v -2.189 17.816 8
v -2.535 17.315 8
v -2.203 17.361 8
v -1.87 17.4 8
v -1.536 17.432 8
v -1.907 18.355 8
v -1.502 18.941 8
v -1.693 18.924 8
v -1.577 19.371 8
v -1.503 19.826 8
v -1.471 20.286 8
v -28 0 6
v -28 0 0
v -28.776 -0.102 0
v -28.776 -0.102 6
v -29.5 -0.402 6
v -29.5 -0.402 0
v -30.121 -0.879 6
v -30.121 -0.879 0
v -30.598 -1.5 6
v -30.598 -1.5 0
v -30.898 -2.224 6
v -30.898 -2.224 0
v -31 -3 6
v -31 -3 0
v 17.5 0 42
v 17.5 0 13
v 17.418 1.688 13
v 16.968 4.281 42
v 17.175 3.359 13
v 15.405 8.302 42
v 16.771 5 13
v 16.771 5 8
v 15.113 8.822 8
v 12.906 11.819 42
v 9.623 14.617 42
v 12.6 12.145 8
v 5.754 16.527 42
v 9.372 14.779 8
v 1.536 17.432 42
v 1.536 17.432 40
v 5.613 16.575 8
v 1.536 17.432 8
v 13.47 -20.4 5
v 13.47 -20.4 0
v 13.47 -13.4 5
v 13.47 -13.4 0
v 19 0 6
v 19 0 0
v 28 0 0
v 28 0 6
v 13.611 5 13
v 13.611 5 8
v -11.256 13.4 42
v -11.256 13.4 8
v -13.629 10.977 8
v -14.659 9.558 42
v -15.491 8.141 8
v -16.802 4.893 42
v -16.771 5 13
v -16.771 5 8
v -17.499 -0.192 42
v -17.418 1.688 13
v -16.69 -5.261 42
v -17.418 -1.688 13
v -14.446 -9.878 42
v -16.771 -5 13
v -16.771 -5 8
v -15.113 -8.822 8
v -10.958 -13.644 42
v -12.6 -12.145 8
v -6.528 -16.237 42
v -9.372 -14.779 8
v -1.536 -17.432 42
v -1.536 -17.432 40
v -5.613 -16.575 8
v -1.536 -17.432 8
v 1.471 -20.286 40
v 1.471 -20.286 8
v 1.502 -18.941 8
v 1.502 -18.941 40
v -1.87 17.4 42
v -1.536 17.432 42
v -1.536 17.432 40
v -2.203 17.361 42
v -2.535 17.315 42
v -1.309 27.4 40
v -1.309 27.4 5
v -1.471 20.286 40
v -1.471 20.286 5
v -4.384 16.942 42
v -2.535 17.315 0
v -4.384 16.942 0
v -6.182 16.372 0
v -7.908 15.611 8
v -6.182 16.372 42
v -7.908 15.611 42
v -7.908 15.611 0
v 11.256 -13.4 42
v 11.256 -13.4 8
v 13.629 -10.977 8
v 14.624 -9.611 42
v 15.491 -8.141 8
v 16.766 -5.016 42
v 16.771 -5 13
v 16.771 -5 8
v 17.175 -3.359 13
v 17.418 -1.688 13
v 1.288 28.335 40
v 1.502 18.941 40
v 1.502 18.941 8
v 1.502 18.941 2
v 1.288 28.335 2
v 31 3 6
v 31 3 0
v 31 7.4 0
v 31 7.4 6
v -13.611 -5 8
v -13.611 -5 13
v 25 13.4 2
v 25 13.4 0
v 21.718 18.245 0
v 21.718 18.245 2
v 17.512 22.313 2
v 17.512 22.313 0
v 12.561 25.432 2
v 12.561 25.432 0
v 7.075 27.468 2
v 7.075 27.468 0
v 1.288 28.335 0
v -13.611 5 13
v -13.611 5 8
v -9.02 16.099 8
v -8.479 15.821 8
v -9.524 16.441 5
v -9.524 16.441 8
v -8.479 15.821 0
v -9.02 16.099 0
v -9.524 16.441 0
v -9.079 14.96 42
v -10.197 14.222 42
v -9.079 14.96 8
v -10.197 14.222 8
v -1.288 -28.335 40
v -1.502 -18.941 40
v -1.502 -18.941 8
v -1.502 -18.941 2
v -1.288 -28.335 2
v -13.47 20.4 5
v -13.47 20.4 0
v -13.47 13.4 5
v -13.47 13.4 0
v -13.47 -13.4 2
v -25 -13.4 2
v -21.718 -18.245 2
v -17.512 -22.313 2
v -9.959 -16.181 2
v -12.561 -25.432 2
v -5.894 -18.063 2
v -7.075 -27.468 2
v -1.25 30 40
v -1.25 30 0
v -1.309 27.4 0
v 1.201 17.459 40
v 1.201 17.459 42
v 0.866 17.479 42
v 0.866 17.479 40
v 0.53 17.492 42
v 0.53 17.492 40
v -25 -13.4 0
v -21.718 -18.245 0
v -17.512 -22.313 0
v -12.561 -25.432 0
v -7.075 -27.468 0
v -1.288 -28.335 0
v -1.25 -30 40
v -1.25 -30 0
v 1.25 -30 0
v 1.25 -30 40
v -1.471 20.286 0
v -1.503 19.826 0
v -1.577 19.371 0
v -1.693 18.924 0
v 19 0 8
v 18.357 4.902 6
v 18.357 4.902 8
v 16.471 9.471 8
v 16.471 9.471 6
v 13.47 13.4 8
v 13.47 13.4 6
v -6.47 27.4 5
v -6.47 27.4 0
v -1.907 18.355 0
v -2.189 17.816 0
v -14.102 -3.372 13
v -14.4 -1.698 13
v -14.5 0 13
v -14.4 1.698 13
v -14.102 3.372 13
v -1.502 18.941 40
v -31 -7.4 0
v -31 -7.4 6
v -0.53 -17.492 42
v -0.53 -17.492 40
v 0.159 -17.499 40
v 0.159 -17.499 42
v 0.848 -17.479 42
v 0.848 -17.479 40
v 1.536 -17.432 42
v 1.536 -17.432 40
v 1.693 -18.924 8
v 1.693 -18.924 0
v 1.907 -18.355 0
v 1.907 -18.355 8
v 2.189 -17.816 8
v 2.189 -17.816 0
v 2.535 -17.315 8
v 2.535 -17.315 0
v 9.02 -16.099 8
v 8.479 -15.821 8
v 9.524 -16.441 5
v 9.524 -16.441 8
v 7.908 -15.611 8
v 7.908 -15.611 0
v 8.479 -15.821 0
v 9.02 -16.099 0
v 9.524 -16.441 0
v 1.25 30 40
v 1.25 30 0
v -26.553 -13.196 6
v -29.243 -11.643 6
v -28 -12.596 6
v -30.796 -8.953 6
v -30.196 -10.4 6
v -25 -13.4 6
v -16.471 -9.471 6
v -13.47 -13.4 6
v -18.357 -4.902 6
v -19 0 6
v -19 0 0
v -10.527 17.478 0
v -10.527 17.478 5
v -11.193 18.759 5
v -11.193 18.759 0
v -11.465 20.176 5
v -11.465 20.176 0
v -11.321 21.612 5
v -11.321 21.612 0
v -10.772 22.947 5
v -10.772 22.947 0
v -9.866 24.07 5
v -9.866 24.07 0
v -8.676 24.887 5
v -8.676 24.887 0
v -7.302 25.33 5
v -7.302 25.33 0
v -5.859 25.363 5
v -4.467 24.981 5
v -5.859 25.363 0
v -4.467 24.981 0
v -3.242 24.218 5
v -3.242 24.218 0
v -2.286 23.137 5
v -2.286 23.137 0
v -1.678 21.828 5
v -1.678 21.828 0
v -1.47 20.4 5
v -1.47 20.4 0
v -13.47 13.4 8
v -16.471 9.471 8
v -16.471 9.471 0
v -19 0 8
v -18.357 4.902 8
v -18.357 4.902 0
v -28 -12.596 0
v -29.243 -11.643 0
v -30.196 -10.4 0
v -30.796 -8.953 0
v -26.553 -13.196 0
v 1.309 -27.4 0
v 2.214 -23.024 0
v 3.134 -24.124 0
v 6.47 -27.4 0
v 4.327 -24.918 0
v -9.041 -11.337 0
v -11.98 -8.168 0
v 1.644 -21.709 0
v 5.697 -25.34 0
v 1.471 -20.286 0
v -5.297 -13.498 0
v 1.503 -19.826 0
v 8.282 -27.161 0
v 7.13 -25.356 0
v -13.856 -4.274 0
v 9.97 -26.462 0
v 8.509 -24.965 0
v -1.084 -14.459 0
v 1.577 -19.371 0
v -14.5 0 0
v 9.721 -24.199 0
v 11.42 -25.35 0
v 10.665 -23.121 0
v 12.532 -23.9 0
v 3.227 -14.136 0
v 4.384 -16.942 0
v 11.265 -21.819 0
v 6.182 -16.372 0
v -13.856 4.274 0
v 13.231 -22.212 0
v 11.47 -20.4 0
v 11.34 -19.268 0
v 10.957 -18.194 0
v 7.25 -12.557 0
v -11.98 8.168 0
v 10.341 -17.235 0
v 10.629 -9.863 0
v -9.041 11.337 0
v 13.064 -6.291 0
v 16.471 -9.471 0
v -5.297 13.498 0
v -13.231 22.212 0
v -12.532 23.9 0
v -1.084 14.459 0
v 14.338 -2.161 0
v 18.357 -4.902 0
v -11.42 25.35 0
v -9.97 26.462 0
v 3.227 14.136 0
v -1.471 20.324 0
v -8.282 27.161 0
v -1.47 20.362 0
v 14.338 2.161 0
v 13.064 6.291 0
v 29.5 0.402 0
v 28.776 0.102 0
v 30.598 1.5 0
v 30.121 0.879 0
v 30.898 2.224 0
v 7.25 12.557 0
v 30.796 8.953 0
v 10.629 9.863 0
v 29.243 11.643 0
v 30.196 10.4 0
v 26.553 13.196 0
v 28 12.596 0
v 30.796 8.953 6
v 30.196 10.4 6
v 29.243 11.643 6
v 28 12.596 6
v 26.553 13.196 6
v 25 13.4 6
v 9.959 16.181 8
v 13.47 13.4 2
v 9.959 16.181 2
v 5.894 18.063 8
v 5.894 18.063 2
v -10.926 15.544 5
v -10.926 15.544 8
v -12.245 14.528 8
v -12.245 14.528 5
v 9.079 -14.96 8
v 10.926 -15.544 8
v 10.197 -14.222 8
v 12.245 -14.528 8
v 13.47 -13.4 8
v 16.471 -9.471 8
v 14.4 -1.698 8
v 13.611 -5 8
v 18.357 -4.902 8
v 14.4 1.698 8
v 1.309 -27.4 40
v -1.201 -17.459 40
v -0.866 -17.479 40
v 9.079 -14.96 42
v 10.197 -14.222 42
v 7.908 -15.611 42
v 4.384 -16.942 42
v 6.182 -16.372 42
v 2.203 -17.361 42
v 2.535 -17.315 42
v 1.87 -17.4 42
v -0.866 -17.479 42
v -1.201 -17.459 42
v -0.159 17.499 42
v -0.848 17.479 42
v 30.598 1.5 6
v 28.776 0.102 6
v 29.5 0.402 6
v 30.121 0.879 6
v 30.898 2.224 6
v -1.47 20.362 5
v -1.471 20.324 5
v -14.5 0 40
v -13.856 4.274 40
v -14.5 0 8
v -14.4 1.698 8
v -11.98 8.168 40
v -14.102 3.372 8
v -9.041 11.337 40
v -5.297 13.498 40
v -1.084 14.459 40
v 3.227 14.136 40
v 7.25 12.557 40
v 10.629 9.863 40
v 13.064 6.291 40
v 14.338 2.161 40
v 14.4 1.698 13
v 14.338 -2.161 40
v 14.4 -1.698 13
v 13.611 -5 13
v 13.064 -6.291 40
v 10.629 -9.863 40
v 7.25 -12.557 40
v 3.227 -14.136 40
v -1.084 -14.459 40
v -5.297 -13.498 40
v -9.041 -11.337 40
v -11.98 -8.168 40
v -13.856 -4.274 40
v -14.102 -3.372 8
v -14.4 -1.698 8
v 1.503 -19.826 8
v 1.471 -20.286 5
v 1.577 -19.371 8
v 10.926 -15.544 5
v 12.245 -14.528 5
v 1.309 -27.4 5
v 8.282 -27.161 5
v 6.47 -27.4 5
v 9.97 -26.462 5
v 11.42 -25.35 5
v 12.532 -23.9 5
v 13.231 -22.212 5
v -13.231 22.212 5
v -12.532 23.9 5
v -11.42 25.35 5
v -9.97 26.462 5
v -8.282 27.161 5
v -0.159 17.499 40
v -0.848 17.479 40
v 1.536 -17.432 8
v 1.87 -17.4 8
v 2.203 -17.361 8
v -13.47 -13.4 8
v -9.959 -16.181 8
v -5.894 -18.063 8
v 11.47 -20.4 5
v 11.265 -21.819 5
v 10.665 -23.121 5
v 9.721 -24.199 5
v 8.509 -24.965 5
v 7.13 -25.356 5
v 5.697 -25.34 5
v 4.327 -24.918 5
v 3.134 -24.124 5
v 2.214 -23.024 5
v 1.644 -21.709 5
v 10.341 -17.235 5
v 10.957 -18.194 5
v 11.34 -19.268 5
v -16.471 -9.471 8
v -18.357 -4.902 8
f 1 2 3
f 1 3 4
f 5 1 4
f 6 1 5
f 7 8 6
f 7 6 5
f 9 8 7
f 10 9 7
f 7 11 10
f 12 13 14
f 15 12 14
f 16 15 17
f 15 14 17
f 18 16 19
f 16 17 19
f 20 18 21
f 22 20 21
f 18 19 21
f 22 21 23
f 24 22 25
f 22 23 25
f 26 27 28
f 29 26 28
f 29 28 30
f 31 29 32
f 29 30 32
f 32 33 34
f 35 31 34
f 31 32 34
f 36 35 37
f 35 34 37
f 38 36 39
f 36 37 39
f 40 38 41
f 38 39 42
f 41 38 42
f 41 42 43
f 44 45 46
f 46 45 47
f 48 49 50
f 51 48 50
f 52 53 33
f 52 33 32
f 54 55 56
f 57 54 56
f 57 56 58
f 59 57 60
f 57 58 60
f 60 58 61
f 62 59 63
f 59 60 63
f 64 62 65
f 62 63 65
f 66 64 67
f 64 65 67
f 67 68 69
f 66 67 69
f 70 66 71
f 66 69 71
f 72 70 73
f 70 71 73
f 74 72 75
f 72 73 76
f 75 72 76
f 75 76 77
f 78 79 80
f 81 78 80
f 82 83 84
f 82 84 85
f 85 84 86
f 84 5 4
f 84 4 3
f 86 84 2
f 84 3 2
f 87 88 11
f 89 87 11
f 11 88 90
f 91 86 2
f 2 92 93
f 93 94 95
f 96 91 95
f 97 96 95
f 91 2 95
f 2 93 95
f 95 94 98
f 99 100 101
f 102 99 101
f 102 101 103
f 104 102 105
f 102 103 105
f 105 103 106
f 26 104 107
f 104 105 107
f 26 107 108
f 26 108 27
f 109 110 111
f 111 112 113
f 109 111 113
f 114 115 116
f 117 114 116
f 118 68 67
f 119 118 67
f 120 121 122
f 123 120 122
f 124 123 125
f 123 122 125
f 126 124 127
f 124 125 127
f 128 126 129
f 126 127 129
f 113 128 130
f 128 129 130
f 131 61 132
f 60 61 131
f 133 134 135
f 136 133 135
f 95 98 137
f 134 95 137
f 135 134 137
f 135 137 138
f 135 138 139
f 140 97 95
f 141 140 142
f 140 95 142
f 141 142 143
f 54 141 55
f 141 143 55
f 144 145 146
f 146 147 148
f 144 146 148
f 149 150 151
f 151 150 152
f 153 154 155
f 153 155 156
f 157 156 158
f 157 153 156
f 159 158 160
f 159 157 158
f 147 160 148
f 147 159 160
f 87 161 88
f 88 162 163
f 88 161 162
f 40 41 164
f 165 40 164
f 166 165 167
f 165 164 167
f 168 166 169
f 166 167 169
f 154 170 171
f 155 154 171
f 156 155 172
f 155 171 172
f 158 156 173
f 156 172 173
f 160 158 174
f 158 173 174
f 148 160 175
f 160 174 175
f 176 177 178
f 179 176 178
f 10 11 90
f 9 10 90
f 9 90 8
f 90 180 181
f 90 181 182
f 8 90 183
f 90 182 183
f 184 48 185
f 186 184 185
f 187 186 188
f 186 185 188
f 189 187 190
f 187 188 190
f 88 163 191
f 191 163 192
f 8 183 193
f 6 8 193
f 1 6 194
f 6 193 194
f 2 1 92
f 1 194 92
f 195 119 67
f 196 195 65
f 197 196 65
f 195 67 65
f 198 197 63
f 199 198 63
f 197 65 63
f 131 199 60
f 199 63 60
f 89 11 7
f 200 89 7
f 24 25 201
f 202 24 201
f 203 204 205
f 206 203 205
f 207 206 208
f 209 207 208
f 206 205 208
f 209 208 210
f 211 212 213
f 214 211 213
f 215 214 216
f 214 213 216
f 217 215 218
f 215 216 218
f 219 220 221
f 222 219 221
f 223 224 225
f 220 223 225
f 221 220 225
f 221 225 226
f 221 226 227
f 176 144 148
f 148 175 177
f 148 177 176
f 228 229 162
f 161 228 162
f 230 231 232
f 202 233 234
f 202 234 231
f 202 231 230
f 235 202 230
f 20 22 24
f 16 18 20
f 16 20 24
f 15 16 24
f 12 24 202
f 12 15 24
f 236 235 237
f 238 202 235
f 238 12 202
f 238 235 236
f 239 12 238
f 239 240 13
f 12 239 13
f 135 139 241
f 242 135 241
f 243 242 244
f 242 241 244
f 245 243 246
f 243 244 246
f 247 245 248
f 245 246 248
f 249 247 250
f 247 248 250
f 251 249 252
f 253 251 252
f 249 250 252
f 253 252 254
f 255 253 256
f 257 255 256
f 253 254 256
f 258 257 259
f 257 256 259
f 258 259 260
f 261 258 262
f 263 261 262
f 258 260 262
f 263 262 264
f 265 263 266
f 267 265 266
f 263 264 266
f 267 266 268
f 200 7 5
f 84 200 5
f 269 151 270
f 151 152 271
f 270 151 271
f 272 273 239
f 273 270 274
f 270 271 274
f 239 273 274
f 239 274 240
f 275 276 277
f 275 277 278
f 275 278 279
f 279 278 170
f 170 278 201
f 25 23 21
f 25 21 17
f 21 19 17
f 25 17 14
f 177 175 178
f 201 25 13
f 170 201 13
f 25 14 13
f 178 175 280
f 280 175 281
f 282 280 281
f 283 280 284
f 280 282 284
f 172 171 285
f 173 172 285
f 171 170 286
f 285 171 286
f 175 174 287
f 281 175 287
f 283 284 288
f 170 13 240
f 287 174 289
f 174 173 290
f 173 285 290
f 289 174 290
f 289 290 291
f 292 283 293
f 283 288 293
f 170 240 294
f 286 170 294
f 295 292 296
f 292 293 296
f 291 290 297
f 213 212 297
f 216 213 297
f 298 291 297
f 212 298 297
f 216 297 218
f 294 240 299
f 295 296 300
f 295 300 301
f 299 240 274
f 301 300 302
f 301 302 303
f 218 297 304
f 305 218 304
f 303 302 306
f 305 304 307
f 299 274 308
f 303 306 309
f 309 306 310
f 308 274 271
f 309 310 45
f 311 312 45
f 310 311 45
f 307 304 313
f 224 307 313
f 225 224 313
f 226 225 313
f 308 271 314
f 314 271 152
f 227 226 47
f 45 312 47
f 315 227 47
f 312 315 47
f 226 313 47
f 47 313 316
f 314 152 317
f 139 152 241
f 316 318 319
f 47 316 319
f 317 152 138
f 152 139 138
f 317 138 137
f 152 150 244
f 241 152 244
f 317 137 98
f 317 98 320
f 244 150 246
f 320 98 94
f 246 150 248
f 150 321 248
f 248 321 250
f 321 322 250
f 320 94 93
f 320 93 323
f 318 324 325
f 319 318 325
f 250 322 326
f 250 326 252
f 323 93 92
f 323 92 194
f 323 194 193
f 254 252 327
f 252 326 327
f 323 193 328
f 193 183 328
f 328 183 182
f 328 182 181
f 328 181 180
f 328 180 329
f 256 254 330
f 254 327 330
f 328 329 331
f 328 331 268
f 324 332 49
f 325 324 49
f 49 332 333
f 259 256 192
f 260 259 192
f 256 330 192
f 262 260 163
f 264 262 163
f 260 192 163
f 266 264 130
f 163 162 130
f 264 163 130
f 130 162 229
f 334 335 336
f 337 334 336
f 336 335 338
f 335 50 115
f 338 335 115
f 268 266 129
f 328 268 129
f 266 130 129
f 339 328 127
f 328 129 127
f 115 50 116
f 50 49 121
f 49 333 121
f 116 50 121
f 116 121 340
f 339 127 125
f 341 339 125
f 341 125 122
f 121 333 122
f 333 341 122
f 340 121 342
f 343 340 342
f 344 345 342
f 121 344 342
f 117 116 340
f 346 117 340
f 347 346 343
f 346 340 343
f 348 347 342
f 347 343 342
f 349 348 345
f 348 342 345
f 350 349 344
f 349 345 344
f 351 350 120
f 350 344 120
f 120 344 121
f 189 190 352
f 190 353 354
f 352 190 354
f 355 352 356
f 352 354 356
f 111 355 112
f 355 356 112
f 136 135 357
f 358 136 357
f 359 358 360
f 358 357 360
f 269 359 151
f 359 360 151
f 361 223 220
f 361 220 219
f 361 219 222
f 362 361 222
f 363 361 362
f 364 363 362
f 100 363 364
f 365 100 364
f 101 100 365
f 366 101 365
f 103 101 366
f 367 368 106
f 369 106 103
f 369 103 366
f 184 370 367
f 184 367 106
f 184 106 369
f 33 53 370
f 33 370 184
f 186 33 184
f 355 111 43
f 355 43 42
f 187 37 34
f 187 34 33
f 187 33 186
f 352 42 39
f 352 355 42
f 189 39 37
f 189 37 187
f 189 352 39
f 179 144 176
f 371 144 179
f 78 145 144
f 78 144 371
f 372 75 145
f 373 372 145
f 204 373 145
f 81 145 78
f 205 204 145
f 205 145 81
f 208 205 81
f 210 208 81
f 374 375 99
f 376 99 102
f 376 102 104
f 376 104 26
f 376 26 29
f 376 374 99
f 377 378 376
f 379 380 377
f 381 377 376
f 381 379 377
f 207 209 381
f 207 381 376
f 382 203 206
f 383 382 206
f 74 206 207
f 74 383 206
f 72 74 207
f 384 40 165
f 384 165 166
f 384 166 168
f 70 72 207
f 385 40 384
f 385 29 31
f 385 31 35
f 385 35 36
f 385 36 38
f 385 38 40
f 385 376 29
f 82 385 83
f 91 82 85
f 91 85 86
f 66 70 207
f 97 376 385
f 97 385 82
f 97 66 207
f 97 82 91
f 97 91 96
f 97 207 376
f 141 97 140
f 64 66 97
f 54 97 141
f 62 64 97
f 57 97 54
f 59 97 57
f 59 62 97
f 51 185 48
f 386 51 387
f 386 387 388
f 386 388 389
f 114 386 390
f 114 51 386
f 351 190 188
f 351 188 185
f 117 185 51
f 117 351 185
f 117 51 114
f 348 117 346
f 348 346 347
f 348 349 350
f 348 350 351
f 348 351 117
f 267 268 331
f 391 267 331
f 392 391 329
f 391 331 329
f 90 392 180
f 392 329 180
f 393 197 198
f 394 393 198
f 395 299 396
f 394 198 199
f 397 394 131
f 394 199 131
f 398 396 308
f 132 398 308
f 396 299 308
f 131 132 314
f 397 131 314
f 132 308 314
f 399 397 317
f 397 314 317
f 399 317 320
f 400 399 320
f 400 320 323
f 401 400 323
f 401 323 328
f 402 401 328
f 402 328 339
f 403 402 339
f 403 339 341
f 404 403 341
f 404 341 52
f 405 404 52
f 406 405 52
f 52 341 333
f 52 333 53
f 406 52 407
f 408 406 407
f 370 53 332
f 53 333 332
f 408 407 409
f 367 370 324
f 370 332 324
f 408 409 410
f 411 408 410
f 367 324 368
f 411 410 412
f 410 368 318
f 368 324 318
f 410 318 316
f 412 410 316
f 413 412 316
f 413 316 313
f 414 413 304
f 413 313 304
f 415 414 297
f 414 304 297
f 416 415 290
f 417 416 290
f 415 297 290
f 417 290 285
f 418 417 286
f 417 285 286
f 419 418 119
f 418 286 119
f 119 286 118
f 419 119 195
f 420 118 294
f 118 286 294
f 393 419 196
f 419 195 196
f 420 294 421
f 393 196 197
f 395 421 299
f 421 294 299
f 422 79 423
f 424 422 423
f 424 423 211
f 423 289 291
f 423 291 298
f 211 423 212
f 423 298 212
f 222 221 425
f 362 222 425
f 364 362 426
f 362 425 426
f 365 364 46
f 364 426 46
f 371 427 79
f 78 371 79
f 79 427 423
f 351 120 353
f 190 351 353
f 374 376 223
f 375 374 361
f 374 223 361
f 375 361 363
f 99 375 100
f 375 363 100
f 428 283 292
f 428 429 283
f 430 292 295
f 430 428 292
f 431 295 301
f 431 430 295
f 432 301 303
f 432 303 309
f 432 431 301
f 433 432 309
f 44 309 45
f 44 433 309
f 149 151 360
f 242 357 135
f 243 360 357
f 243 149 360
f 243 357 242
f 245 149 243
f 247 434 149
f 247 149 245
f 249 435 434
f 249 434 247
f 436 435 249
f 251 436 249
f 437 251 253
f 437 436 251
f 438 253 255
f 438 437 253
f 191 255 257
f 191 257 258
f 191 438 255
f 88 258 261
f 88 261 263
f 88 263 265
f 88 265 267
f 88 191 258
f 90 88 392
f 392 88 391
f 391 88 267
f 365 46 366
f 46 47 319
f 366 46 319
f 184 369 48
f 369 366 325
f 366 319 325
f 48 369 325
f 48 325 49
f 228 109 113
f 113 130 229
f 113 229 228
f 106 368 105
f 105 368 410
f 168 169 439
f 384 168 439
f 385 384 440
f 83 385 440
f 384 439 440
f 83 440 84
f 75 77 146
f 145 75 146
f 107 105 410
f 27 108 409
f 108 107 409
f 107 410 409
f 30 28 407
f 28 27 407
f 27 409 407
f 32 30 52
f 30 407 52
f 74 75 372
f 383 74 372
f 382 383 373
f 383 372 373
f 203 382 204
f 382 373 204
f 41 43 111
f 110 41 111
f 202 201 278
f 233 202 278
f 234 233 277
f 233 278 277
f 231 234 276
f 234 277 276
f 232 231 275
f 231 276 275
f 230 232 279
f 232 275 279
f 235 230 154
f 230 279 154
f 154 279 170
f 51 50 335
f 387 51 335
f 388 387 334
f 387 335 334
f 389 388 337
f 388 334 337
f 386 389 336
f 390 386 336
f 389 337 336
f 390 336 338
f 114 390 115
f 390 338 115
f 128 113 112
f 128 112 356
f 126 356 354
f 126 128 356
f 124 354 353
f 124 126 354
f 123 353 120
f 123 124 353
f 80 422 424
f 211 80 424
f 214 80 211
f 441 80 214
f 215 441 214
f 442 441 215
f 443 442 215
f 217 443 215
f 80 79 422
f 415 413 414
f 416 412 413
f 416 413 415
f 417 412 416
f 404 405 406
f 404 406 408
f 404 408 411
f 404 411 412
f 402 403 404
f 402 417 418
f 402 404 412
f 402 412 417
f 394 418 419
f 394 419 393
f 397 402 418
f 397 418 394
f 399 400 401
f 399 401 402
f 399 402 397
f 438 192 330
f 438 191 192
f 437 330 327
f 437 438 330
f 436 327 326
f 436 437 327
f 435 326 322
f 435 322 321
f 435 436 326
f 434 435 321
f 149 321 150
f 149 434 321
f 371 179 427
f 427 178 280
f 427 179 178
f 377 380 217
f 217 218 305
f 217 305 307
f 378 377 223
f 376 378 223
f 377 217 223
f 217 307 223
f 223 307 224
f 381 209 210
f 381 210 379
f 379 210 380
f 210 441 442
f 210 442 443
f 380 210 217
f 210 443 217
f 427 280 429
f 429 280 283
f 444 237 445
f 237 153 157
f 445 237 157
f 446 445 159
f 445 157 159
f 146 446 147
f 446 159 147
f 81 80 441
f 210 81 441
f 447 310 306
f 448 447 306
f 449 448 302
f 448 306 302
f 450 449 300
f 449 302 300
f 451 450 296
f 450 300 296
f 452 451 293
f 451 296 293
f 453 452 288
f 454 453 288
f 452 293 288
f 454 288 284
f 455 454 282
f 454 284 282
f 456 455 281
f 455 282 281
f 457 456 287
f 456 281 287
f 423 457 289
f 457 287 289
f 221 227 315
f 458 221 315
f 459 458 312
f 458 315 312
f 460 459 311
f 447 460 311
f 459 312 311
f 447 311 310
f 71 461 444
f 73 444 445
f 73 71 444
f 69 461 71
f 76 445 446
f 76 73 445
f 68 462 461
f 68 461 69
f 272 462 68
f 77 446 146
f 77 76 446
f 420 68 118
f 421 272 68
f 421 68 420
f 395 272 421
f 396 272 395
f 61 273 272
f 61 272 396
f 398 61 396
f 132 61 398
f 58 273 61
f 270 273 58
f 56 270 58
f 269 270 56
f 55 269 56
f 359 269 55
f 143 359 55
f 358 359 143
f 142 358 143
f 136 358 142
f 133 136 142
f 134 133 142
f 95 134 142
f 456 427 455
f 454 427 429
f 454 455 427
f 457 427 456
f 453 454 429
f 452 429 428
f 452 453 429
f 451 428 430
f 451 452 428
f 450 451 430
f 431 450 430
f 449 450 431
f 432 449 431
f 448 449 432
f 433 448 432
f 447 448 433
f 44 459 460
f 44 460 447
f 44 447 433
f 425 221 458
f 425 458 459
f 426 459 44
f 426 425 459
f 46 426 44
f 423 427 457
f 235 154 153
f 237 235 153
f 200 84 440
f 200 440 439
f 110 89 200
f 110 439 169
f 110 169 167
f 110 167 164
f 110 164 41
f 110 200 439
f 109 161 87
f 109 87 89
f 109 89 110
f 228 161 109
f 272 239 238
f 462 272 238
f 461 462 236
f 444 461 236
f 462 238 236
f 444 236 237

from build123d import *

# Parameters (mm, degrees)
BOSS_EXTRUDE1_DEPTH   = 5
BOSS_EXTRUDE1_2_DEPTH = 5
BOSS_EXTRUDE2_DEPTH   = 40
BOSS_EXTRUDE3_DEPTH   = 42
BOSS_EXTRUDE4_DEPTH   = 8
BOSS_EXTRUDE5_DEPTH   = 6
BOSS_EXTRUDE6_DEPTH   = 2
FILLET1_R             = 7
BOSS_EXTRUDE7_DEPTH   = 42
SKETCH2_R             = 14.5
CUT_EXTRUDE1_DEPTH    = 40
SKETCH3_W             = 5
SKETCH3_H             = 10
CUT_EXTRUDE2_DEPTH    = 40


with BuildPart() as part:
    # Sketch1 → Boss-Extrude1 (new body)
    with BuildSketch(Plane.XY):
        with BuildLine():
            Line((-13.47, 27.399966418), (-13.47, 13.399966418))
            ThreePointArc((-13.47, 13.399966418), (-11.596936091, 15.050284825), (-9.523675037, 16.440791154))
            ThreePointArc((-9.523675037, 16.440791154), (-8.624614178, 24.911910317), (-1.471296976, 20.286088952))
            Line((-1.471296976, 20.286088952), (-1.309232534, 27.399966418))
            Line((-1.309232534, 27.399966418), (-13.47, 27.399966418))
        make_face()
    extrude(amount=BOSS_EXTRUDE1_DEPTH)



with BuildPart() as body_2:
    # Sketch1 → Boss-Extrude1 2 (new body)
    with BuildSketch(Plane.XY):
        with BuildLine():
            Line((1.471296984, -20.286088587), (1.309232534, -27.399966418))
            Line((1.309232534, -27.399966418), (13.47, -27.399966418))
            Line((13.47, -27.399966418), (13.47, -13.399966418))
            ThreePointArc((13.47, -13.399966418), (11.596936091, -15.050284825), (9.523675037, -16.440791154))
            ThreePointArc((9.523675037, -16.440791154), (8.624614013, -24.911910395), (1.471296984, -20.286088587))
        make_face()
    extrude(amount=BOSS_EXTRUDE1_2_DEPTH)


with BuildPart() as part_1:
    add(part.part)

    add(body_2.part)  # Boss-Extrude2 merges body 2
    # Sketch1<3> → Boss-Extrude2 (add)
    with BuildSketch(Plane.XY):
        with BuildLine():
            Line((-1.25, 30), (-1.53630737, 17.432434129))
            ThreePointArc((-1.53630737, 17.432434129), (0, 17.5), (1.53630737, 17.432434129))
            Line((1.53630737, 17.432434129), (1.25, 30))
            Line((1.25, 30), (-1.25, 30))
        make_face()
        with BuildLine():
            Line((-1.53630737, -17.432434129), (-1.25, -30))
            Line((-1.25, -30), (1.25, -30))
            Line((1.25, -30), (1.53630737, -17.432434129))
            ThreePointArc((1.53630737, -17.432434129), (0, -17.5), (-1.53630737, -17.432434129))
        make_face()
    extrude(amount=BOSS_EXTRUDE2_DEPTH)

    # Sketch1<4> → Boss-Extrude3 (add)
    with BuildSketch(Plane.XY):
        with BuildLine():
            ThreePointArc((-7.908141071, 15.611255708), (-16.68113138, -5.290544005), (2.534806328, -17.315448504))
            ThreePointArc((2.534806328, -17.315448504), (4.958415999, -15.633928881), (7.908141071, -15.611255708))
            ThreePointArc((7.908141071, -15.611255708), (16.68113138, 5.290544005), (-2.534806328, 17.315448504))
            ThreePointArc((-2.534806328, 17.315448504), (-4.958415999, 15.633928881), (-7.908141071, 15.611255708))
        make_face()
    extrude(amount=BOSS_EXTRUDE3_DEPTH)

    # Sketch1<5> → Boss-Extrude4 (add)
    with BuildSketch(Plane.XY):
        with BuildLine():
            ThreePointArc((-9.523675037, 16.440791154), (-18.529727325, -4.201095719), (-1.501950478, -18.940542357))
            Line((-1.501950478, -18.940542357), (-1.53630737, -17.432434129))
            ThreePointArc((-1.53630737, -17.432434129), (-17.18344439, -3.313493457), (-7.908141071, 15.611255708))
            ThreePointArc((-7.908141071, 15.611255708), (-8.753885998, 15.952060759), (-9.523675037, 16.440791154))
        make_face()
        with BuildLine():
            ThreePointArc((-1.471296976, 20.286088952), (-1.76257993, 18.714678227), (-2.534806328, 17.315448504))
            ThreePointArc((-2.534806328, 17.315448504), (-2.036397087, 17.381112936), (-1.53630737, 17.432434129))
            Line((-1.53630737, 17.432434129), (-1.471296976, 20.286088952))
        make_face()
        with BuildLine():
            Line((1.501950478, 18.940542357), (1.53630737, 17.432434129))
            ThreePointArc((1.53630737, 17.432434129), (17.18344439, 3.313493457), (7.908141071, -15.611255708))
            ThreePointArc((7.908141071, -15.611255708), (8.753885998, -15.952060759), (9.523675037, -16.440791154))
            ThreePointArc((9.523675037, -16.440791154), (18.529727325, 4.201095719), (1.501950478, 18.940542357))
        make_face()
        with BuildLine():
            ThreePointArc((2.534806328, -17.315448504), (2.036397087, -17.381112936), (1.53630737, -17.432434129))
            Line((1.53630737, -17.432434129), (1.471296984, -20.286088587))
            ThreePointArc((1.471296984, -20.286088587), (1.762579992, -18.714678055), (2.534806328, -17.315448504))
        make_face()
    extrude(amount=BOSS_EXTRUDE4_DEPTH)

    # Sketch1<6> → Boss-Extrude5 (add)
    with BuildSketch(Plane.XY):
        with BuildLine():
            ThreePointArc((-13.47, -13.399966418), (-17.563171695, -7.2481032), (-19, 0))
            Line((-19, 0), (-28, 0))
            ThreePointArc((-28, 0), (-30.121320344, -0.878679656), (-31, -3))
            Line((-31, -3), (-31, -7.399966418))
            ThreePointArc((-31, -7.399966418), (-29.242640687, -11.642607105), (-25, -13.399966418))
            Line((-25, -13.399966418), (-13.47, -13.399966418))
        make_face()
        with BuildLine():
            Line((25, 13.399966418), (13.47, 13.399966418))
            ThreePointArc((13.47, 13.399966418), (17.563171695, 7.2481032), (19, 0))
            Line((19, 0), (28, 0))
            ThreePointArc((28, 0), (30.121320344, 0.878679656), (31, 3))
            Line((31, 3), (31, 7.399966418))
            ThreePointArc((31, 7.399966418), (29.242640687, 11.642607105), (25, 13.399966418))
        make_face()
    extrude(amount=BOSS_EXTRUDE5_DEPTH)

    # Sketch1<7> → Boss-Extrude6 (add)
    with BuildSketch(Plane.XY):
        with BuildLine():
            ThreePointArc((-1.501950478, -18.940542357), (-7.982125075, -17.241974344), (-13.47, -13.399966418))
            Line((-13.47, -13.399966418), (-25, -13.399966418))
            ThreePointArc((-25, -13.399966418), (-15.117248317, -24.000581312), (-1.287919802, -28.335496512))
            Line((-1.287919802, -28.335496512), (-1.501950478, -18.940542357))
        make_face()
        with BuildLine():
            Line((1.287919802, 28.335496512), (1.501950478, 18.940542357))
            ThreePointArc((1.501950478, 18.940542357), (7.982125075, 17.241974344), (13.47, 13.399966418))
            Line((13.47, 13.399966418), (25, 13.399966418))
            ThreePointArc((25, 13.399966418), (15.117248317, 24.000581312), (1.287919802, 28.335496512))
        make_face()
    extrude(amount=BOSS_EXTRUDE6_DEPTH)

    # Fillet1
    fillet1_edges = [part_1.edges().sort_by_distance(p)[0] for p in [
        (13.47, -27.399966418, 2.5),
        (-13.47, 27.399966418, 2.5),
    ]]
    fillet(fillet1_edges, radius=FILLET1_R)

    # Sketch1<8> → Boss-Extrude7 (add)
    with BuildSketch(Plane.XY):
        with BuildLine():
            ThreePointArc((-2.534806328, 17.315448504), (-5.290544005, 16.68113138), (-7.908141071, 15.611255708))
            ThreePointArc((-7.908141071, 15.611255708), (-4.958415999, 15.633928881), (-2.534806328, 17.315448504))
        make_face()
        with BuildLine():
            ThreePointArc((7.908141071, -15.611255708), (4.958415999, -15.633928881), (2.534806328, -17.315448504))
            ThreePointArc((2.534806328, -17.315448504), (5.290544005, -16.68113138), (7.908141071, -15.611255708))
        make_face()
    extrude(amount=BOSS_EXTRUDE7_DEPTH)

    # Sketch2 → Cut-Extrude1 (cut)
    with BuildSketch(Plane(origin=(0, 0, 0), x_dir=(-1, 0, 0), z_dir=(0, 0, -1))):
        Circle(SKETCH2_R)
    extrude(amount=-CUT_EXTRUDE1_DEPTH, mode=Mode.SUBTRACT)

    # Sketch3 → Cut-Extrude2 (cut)
    with BuildSketch(Plane.ZY.offset(17.5)):
        with Locations((10.5, 0)):
            Rectangle(SKETCH3_W, SKETCH3_H)
    extrude(amount=-CUT_EXTRUDE2_DEPTH, mode=Mode.SUBTRACT)


solid = part_1.part
